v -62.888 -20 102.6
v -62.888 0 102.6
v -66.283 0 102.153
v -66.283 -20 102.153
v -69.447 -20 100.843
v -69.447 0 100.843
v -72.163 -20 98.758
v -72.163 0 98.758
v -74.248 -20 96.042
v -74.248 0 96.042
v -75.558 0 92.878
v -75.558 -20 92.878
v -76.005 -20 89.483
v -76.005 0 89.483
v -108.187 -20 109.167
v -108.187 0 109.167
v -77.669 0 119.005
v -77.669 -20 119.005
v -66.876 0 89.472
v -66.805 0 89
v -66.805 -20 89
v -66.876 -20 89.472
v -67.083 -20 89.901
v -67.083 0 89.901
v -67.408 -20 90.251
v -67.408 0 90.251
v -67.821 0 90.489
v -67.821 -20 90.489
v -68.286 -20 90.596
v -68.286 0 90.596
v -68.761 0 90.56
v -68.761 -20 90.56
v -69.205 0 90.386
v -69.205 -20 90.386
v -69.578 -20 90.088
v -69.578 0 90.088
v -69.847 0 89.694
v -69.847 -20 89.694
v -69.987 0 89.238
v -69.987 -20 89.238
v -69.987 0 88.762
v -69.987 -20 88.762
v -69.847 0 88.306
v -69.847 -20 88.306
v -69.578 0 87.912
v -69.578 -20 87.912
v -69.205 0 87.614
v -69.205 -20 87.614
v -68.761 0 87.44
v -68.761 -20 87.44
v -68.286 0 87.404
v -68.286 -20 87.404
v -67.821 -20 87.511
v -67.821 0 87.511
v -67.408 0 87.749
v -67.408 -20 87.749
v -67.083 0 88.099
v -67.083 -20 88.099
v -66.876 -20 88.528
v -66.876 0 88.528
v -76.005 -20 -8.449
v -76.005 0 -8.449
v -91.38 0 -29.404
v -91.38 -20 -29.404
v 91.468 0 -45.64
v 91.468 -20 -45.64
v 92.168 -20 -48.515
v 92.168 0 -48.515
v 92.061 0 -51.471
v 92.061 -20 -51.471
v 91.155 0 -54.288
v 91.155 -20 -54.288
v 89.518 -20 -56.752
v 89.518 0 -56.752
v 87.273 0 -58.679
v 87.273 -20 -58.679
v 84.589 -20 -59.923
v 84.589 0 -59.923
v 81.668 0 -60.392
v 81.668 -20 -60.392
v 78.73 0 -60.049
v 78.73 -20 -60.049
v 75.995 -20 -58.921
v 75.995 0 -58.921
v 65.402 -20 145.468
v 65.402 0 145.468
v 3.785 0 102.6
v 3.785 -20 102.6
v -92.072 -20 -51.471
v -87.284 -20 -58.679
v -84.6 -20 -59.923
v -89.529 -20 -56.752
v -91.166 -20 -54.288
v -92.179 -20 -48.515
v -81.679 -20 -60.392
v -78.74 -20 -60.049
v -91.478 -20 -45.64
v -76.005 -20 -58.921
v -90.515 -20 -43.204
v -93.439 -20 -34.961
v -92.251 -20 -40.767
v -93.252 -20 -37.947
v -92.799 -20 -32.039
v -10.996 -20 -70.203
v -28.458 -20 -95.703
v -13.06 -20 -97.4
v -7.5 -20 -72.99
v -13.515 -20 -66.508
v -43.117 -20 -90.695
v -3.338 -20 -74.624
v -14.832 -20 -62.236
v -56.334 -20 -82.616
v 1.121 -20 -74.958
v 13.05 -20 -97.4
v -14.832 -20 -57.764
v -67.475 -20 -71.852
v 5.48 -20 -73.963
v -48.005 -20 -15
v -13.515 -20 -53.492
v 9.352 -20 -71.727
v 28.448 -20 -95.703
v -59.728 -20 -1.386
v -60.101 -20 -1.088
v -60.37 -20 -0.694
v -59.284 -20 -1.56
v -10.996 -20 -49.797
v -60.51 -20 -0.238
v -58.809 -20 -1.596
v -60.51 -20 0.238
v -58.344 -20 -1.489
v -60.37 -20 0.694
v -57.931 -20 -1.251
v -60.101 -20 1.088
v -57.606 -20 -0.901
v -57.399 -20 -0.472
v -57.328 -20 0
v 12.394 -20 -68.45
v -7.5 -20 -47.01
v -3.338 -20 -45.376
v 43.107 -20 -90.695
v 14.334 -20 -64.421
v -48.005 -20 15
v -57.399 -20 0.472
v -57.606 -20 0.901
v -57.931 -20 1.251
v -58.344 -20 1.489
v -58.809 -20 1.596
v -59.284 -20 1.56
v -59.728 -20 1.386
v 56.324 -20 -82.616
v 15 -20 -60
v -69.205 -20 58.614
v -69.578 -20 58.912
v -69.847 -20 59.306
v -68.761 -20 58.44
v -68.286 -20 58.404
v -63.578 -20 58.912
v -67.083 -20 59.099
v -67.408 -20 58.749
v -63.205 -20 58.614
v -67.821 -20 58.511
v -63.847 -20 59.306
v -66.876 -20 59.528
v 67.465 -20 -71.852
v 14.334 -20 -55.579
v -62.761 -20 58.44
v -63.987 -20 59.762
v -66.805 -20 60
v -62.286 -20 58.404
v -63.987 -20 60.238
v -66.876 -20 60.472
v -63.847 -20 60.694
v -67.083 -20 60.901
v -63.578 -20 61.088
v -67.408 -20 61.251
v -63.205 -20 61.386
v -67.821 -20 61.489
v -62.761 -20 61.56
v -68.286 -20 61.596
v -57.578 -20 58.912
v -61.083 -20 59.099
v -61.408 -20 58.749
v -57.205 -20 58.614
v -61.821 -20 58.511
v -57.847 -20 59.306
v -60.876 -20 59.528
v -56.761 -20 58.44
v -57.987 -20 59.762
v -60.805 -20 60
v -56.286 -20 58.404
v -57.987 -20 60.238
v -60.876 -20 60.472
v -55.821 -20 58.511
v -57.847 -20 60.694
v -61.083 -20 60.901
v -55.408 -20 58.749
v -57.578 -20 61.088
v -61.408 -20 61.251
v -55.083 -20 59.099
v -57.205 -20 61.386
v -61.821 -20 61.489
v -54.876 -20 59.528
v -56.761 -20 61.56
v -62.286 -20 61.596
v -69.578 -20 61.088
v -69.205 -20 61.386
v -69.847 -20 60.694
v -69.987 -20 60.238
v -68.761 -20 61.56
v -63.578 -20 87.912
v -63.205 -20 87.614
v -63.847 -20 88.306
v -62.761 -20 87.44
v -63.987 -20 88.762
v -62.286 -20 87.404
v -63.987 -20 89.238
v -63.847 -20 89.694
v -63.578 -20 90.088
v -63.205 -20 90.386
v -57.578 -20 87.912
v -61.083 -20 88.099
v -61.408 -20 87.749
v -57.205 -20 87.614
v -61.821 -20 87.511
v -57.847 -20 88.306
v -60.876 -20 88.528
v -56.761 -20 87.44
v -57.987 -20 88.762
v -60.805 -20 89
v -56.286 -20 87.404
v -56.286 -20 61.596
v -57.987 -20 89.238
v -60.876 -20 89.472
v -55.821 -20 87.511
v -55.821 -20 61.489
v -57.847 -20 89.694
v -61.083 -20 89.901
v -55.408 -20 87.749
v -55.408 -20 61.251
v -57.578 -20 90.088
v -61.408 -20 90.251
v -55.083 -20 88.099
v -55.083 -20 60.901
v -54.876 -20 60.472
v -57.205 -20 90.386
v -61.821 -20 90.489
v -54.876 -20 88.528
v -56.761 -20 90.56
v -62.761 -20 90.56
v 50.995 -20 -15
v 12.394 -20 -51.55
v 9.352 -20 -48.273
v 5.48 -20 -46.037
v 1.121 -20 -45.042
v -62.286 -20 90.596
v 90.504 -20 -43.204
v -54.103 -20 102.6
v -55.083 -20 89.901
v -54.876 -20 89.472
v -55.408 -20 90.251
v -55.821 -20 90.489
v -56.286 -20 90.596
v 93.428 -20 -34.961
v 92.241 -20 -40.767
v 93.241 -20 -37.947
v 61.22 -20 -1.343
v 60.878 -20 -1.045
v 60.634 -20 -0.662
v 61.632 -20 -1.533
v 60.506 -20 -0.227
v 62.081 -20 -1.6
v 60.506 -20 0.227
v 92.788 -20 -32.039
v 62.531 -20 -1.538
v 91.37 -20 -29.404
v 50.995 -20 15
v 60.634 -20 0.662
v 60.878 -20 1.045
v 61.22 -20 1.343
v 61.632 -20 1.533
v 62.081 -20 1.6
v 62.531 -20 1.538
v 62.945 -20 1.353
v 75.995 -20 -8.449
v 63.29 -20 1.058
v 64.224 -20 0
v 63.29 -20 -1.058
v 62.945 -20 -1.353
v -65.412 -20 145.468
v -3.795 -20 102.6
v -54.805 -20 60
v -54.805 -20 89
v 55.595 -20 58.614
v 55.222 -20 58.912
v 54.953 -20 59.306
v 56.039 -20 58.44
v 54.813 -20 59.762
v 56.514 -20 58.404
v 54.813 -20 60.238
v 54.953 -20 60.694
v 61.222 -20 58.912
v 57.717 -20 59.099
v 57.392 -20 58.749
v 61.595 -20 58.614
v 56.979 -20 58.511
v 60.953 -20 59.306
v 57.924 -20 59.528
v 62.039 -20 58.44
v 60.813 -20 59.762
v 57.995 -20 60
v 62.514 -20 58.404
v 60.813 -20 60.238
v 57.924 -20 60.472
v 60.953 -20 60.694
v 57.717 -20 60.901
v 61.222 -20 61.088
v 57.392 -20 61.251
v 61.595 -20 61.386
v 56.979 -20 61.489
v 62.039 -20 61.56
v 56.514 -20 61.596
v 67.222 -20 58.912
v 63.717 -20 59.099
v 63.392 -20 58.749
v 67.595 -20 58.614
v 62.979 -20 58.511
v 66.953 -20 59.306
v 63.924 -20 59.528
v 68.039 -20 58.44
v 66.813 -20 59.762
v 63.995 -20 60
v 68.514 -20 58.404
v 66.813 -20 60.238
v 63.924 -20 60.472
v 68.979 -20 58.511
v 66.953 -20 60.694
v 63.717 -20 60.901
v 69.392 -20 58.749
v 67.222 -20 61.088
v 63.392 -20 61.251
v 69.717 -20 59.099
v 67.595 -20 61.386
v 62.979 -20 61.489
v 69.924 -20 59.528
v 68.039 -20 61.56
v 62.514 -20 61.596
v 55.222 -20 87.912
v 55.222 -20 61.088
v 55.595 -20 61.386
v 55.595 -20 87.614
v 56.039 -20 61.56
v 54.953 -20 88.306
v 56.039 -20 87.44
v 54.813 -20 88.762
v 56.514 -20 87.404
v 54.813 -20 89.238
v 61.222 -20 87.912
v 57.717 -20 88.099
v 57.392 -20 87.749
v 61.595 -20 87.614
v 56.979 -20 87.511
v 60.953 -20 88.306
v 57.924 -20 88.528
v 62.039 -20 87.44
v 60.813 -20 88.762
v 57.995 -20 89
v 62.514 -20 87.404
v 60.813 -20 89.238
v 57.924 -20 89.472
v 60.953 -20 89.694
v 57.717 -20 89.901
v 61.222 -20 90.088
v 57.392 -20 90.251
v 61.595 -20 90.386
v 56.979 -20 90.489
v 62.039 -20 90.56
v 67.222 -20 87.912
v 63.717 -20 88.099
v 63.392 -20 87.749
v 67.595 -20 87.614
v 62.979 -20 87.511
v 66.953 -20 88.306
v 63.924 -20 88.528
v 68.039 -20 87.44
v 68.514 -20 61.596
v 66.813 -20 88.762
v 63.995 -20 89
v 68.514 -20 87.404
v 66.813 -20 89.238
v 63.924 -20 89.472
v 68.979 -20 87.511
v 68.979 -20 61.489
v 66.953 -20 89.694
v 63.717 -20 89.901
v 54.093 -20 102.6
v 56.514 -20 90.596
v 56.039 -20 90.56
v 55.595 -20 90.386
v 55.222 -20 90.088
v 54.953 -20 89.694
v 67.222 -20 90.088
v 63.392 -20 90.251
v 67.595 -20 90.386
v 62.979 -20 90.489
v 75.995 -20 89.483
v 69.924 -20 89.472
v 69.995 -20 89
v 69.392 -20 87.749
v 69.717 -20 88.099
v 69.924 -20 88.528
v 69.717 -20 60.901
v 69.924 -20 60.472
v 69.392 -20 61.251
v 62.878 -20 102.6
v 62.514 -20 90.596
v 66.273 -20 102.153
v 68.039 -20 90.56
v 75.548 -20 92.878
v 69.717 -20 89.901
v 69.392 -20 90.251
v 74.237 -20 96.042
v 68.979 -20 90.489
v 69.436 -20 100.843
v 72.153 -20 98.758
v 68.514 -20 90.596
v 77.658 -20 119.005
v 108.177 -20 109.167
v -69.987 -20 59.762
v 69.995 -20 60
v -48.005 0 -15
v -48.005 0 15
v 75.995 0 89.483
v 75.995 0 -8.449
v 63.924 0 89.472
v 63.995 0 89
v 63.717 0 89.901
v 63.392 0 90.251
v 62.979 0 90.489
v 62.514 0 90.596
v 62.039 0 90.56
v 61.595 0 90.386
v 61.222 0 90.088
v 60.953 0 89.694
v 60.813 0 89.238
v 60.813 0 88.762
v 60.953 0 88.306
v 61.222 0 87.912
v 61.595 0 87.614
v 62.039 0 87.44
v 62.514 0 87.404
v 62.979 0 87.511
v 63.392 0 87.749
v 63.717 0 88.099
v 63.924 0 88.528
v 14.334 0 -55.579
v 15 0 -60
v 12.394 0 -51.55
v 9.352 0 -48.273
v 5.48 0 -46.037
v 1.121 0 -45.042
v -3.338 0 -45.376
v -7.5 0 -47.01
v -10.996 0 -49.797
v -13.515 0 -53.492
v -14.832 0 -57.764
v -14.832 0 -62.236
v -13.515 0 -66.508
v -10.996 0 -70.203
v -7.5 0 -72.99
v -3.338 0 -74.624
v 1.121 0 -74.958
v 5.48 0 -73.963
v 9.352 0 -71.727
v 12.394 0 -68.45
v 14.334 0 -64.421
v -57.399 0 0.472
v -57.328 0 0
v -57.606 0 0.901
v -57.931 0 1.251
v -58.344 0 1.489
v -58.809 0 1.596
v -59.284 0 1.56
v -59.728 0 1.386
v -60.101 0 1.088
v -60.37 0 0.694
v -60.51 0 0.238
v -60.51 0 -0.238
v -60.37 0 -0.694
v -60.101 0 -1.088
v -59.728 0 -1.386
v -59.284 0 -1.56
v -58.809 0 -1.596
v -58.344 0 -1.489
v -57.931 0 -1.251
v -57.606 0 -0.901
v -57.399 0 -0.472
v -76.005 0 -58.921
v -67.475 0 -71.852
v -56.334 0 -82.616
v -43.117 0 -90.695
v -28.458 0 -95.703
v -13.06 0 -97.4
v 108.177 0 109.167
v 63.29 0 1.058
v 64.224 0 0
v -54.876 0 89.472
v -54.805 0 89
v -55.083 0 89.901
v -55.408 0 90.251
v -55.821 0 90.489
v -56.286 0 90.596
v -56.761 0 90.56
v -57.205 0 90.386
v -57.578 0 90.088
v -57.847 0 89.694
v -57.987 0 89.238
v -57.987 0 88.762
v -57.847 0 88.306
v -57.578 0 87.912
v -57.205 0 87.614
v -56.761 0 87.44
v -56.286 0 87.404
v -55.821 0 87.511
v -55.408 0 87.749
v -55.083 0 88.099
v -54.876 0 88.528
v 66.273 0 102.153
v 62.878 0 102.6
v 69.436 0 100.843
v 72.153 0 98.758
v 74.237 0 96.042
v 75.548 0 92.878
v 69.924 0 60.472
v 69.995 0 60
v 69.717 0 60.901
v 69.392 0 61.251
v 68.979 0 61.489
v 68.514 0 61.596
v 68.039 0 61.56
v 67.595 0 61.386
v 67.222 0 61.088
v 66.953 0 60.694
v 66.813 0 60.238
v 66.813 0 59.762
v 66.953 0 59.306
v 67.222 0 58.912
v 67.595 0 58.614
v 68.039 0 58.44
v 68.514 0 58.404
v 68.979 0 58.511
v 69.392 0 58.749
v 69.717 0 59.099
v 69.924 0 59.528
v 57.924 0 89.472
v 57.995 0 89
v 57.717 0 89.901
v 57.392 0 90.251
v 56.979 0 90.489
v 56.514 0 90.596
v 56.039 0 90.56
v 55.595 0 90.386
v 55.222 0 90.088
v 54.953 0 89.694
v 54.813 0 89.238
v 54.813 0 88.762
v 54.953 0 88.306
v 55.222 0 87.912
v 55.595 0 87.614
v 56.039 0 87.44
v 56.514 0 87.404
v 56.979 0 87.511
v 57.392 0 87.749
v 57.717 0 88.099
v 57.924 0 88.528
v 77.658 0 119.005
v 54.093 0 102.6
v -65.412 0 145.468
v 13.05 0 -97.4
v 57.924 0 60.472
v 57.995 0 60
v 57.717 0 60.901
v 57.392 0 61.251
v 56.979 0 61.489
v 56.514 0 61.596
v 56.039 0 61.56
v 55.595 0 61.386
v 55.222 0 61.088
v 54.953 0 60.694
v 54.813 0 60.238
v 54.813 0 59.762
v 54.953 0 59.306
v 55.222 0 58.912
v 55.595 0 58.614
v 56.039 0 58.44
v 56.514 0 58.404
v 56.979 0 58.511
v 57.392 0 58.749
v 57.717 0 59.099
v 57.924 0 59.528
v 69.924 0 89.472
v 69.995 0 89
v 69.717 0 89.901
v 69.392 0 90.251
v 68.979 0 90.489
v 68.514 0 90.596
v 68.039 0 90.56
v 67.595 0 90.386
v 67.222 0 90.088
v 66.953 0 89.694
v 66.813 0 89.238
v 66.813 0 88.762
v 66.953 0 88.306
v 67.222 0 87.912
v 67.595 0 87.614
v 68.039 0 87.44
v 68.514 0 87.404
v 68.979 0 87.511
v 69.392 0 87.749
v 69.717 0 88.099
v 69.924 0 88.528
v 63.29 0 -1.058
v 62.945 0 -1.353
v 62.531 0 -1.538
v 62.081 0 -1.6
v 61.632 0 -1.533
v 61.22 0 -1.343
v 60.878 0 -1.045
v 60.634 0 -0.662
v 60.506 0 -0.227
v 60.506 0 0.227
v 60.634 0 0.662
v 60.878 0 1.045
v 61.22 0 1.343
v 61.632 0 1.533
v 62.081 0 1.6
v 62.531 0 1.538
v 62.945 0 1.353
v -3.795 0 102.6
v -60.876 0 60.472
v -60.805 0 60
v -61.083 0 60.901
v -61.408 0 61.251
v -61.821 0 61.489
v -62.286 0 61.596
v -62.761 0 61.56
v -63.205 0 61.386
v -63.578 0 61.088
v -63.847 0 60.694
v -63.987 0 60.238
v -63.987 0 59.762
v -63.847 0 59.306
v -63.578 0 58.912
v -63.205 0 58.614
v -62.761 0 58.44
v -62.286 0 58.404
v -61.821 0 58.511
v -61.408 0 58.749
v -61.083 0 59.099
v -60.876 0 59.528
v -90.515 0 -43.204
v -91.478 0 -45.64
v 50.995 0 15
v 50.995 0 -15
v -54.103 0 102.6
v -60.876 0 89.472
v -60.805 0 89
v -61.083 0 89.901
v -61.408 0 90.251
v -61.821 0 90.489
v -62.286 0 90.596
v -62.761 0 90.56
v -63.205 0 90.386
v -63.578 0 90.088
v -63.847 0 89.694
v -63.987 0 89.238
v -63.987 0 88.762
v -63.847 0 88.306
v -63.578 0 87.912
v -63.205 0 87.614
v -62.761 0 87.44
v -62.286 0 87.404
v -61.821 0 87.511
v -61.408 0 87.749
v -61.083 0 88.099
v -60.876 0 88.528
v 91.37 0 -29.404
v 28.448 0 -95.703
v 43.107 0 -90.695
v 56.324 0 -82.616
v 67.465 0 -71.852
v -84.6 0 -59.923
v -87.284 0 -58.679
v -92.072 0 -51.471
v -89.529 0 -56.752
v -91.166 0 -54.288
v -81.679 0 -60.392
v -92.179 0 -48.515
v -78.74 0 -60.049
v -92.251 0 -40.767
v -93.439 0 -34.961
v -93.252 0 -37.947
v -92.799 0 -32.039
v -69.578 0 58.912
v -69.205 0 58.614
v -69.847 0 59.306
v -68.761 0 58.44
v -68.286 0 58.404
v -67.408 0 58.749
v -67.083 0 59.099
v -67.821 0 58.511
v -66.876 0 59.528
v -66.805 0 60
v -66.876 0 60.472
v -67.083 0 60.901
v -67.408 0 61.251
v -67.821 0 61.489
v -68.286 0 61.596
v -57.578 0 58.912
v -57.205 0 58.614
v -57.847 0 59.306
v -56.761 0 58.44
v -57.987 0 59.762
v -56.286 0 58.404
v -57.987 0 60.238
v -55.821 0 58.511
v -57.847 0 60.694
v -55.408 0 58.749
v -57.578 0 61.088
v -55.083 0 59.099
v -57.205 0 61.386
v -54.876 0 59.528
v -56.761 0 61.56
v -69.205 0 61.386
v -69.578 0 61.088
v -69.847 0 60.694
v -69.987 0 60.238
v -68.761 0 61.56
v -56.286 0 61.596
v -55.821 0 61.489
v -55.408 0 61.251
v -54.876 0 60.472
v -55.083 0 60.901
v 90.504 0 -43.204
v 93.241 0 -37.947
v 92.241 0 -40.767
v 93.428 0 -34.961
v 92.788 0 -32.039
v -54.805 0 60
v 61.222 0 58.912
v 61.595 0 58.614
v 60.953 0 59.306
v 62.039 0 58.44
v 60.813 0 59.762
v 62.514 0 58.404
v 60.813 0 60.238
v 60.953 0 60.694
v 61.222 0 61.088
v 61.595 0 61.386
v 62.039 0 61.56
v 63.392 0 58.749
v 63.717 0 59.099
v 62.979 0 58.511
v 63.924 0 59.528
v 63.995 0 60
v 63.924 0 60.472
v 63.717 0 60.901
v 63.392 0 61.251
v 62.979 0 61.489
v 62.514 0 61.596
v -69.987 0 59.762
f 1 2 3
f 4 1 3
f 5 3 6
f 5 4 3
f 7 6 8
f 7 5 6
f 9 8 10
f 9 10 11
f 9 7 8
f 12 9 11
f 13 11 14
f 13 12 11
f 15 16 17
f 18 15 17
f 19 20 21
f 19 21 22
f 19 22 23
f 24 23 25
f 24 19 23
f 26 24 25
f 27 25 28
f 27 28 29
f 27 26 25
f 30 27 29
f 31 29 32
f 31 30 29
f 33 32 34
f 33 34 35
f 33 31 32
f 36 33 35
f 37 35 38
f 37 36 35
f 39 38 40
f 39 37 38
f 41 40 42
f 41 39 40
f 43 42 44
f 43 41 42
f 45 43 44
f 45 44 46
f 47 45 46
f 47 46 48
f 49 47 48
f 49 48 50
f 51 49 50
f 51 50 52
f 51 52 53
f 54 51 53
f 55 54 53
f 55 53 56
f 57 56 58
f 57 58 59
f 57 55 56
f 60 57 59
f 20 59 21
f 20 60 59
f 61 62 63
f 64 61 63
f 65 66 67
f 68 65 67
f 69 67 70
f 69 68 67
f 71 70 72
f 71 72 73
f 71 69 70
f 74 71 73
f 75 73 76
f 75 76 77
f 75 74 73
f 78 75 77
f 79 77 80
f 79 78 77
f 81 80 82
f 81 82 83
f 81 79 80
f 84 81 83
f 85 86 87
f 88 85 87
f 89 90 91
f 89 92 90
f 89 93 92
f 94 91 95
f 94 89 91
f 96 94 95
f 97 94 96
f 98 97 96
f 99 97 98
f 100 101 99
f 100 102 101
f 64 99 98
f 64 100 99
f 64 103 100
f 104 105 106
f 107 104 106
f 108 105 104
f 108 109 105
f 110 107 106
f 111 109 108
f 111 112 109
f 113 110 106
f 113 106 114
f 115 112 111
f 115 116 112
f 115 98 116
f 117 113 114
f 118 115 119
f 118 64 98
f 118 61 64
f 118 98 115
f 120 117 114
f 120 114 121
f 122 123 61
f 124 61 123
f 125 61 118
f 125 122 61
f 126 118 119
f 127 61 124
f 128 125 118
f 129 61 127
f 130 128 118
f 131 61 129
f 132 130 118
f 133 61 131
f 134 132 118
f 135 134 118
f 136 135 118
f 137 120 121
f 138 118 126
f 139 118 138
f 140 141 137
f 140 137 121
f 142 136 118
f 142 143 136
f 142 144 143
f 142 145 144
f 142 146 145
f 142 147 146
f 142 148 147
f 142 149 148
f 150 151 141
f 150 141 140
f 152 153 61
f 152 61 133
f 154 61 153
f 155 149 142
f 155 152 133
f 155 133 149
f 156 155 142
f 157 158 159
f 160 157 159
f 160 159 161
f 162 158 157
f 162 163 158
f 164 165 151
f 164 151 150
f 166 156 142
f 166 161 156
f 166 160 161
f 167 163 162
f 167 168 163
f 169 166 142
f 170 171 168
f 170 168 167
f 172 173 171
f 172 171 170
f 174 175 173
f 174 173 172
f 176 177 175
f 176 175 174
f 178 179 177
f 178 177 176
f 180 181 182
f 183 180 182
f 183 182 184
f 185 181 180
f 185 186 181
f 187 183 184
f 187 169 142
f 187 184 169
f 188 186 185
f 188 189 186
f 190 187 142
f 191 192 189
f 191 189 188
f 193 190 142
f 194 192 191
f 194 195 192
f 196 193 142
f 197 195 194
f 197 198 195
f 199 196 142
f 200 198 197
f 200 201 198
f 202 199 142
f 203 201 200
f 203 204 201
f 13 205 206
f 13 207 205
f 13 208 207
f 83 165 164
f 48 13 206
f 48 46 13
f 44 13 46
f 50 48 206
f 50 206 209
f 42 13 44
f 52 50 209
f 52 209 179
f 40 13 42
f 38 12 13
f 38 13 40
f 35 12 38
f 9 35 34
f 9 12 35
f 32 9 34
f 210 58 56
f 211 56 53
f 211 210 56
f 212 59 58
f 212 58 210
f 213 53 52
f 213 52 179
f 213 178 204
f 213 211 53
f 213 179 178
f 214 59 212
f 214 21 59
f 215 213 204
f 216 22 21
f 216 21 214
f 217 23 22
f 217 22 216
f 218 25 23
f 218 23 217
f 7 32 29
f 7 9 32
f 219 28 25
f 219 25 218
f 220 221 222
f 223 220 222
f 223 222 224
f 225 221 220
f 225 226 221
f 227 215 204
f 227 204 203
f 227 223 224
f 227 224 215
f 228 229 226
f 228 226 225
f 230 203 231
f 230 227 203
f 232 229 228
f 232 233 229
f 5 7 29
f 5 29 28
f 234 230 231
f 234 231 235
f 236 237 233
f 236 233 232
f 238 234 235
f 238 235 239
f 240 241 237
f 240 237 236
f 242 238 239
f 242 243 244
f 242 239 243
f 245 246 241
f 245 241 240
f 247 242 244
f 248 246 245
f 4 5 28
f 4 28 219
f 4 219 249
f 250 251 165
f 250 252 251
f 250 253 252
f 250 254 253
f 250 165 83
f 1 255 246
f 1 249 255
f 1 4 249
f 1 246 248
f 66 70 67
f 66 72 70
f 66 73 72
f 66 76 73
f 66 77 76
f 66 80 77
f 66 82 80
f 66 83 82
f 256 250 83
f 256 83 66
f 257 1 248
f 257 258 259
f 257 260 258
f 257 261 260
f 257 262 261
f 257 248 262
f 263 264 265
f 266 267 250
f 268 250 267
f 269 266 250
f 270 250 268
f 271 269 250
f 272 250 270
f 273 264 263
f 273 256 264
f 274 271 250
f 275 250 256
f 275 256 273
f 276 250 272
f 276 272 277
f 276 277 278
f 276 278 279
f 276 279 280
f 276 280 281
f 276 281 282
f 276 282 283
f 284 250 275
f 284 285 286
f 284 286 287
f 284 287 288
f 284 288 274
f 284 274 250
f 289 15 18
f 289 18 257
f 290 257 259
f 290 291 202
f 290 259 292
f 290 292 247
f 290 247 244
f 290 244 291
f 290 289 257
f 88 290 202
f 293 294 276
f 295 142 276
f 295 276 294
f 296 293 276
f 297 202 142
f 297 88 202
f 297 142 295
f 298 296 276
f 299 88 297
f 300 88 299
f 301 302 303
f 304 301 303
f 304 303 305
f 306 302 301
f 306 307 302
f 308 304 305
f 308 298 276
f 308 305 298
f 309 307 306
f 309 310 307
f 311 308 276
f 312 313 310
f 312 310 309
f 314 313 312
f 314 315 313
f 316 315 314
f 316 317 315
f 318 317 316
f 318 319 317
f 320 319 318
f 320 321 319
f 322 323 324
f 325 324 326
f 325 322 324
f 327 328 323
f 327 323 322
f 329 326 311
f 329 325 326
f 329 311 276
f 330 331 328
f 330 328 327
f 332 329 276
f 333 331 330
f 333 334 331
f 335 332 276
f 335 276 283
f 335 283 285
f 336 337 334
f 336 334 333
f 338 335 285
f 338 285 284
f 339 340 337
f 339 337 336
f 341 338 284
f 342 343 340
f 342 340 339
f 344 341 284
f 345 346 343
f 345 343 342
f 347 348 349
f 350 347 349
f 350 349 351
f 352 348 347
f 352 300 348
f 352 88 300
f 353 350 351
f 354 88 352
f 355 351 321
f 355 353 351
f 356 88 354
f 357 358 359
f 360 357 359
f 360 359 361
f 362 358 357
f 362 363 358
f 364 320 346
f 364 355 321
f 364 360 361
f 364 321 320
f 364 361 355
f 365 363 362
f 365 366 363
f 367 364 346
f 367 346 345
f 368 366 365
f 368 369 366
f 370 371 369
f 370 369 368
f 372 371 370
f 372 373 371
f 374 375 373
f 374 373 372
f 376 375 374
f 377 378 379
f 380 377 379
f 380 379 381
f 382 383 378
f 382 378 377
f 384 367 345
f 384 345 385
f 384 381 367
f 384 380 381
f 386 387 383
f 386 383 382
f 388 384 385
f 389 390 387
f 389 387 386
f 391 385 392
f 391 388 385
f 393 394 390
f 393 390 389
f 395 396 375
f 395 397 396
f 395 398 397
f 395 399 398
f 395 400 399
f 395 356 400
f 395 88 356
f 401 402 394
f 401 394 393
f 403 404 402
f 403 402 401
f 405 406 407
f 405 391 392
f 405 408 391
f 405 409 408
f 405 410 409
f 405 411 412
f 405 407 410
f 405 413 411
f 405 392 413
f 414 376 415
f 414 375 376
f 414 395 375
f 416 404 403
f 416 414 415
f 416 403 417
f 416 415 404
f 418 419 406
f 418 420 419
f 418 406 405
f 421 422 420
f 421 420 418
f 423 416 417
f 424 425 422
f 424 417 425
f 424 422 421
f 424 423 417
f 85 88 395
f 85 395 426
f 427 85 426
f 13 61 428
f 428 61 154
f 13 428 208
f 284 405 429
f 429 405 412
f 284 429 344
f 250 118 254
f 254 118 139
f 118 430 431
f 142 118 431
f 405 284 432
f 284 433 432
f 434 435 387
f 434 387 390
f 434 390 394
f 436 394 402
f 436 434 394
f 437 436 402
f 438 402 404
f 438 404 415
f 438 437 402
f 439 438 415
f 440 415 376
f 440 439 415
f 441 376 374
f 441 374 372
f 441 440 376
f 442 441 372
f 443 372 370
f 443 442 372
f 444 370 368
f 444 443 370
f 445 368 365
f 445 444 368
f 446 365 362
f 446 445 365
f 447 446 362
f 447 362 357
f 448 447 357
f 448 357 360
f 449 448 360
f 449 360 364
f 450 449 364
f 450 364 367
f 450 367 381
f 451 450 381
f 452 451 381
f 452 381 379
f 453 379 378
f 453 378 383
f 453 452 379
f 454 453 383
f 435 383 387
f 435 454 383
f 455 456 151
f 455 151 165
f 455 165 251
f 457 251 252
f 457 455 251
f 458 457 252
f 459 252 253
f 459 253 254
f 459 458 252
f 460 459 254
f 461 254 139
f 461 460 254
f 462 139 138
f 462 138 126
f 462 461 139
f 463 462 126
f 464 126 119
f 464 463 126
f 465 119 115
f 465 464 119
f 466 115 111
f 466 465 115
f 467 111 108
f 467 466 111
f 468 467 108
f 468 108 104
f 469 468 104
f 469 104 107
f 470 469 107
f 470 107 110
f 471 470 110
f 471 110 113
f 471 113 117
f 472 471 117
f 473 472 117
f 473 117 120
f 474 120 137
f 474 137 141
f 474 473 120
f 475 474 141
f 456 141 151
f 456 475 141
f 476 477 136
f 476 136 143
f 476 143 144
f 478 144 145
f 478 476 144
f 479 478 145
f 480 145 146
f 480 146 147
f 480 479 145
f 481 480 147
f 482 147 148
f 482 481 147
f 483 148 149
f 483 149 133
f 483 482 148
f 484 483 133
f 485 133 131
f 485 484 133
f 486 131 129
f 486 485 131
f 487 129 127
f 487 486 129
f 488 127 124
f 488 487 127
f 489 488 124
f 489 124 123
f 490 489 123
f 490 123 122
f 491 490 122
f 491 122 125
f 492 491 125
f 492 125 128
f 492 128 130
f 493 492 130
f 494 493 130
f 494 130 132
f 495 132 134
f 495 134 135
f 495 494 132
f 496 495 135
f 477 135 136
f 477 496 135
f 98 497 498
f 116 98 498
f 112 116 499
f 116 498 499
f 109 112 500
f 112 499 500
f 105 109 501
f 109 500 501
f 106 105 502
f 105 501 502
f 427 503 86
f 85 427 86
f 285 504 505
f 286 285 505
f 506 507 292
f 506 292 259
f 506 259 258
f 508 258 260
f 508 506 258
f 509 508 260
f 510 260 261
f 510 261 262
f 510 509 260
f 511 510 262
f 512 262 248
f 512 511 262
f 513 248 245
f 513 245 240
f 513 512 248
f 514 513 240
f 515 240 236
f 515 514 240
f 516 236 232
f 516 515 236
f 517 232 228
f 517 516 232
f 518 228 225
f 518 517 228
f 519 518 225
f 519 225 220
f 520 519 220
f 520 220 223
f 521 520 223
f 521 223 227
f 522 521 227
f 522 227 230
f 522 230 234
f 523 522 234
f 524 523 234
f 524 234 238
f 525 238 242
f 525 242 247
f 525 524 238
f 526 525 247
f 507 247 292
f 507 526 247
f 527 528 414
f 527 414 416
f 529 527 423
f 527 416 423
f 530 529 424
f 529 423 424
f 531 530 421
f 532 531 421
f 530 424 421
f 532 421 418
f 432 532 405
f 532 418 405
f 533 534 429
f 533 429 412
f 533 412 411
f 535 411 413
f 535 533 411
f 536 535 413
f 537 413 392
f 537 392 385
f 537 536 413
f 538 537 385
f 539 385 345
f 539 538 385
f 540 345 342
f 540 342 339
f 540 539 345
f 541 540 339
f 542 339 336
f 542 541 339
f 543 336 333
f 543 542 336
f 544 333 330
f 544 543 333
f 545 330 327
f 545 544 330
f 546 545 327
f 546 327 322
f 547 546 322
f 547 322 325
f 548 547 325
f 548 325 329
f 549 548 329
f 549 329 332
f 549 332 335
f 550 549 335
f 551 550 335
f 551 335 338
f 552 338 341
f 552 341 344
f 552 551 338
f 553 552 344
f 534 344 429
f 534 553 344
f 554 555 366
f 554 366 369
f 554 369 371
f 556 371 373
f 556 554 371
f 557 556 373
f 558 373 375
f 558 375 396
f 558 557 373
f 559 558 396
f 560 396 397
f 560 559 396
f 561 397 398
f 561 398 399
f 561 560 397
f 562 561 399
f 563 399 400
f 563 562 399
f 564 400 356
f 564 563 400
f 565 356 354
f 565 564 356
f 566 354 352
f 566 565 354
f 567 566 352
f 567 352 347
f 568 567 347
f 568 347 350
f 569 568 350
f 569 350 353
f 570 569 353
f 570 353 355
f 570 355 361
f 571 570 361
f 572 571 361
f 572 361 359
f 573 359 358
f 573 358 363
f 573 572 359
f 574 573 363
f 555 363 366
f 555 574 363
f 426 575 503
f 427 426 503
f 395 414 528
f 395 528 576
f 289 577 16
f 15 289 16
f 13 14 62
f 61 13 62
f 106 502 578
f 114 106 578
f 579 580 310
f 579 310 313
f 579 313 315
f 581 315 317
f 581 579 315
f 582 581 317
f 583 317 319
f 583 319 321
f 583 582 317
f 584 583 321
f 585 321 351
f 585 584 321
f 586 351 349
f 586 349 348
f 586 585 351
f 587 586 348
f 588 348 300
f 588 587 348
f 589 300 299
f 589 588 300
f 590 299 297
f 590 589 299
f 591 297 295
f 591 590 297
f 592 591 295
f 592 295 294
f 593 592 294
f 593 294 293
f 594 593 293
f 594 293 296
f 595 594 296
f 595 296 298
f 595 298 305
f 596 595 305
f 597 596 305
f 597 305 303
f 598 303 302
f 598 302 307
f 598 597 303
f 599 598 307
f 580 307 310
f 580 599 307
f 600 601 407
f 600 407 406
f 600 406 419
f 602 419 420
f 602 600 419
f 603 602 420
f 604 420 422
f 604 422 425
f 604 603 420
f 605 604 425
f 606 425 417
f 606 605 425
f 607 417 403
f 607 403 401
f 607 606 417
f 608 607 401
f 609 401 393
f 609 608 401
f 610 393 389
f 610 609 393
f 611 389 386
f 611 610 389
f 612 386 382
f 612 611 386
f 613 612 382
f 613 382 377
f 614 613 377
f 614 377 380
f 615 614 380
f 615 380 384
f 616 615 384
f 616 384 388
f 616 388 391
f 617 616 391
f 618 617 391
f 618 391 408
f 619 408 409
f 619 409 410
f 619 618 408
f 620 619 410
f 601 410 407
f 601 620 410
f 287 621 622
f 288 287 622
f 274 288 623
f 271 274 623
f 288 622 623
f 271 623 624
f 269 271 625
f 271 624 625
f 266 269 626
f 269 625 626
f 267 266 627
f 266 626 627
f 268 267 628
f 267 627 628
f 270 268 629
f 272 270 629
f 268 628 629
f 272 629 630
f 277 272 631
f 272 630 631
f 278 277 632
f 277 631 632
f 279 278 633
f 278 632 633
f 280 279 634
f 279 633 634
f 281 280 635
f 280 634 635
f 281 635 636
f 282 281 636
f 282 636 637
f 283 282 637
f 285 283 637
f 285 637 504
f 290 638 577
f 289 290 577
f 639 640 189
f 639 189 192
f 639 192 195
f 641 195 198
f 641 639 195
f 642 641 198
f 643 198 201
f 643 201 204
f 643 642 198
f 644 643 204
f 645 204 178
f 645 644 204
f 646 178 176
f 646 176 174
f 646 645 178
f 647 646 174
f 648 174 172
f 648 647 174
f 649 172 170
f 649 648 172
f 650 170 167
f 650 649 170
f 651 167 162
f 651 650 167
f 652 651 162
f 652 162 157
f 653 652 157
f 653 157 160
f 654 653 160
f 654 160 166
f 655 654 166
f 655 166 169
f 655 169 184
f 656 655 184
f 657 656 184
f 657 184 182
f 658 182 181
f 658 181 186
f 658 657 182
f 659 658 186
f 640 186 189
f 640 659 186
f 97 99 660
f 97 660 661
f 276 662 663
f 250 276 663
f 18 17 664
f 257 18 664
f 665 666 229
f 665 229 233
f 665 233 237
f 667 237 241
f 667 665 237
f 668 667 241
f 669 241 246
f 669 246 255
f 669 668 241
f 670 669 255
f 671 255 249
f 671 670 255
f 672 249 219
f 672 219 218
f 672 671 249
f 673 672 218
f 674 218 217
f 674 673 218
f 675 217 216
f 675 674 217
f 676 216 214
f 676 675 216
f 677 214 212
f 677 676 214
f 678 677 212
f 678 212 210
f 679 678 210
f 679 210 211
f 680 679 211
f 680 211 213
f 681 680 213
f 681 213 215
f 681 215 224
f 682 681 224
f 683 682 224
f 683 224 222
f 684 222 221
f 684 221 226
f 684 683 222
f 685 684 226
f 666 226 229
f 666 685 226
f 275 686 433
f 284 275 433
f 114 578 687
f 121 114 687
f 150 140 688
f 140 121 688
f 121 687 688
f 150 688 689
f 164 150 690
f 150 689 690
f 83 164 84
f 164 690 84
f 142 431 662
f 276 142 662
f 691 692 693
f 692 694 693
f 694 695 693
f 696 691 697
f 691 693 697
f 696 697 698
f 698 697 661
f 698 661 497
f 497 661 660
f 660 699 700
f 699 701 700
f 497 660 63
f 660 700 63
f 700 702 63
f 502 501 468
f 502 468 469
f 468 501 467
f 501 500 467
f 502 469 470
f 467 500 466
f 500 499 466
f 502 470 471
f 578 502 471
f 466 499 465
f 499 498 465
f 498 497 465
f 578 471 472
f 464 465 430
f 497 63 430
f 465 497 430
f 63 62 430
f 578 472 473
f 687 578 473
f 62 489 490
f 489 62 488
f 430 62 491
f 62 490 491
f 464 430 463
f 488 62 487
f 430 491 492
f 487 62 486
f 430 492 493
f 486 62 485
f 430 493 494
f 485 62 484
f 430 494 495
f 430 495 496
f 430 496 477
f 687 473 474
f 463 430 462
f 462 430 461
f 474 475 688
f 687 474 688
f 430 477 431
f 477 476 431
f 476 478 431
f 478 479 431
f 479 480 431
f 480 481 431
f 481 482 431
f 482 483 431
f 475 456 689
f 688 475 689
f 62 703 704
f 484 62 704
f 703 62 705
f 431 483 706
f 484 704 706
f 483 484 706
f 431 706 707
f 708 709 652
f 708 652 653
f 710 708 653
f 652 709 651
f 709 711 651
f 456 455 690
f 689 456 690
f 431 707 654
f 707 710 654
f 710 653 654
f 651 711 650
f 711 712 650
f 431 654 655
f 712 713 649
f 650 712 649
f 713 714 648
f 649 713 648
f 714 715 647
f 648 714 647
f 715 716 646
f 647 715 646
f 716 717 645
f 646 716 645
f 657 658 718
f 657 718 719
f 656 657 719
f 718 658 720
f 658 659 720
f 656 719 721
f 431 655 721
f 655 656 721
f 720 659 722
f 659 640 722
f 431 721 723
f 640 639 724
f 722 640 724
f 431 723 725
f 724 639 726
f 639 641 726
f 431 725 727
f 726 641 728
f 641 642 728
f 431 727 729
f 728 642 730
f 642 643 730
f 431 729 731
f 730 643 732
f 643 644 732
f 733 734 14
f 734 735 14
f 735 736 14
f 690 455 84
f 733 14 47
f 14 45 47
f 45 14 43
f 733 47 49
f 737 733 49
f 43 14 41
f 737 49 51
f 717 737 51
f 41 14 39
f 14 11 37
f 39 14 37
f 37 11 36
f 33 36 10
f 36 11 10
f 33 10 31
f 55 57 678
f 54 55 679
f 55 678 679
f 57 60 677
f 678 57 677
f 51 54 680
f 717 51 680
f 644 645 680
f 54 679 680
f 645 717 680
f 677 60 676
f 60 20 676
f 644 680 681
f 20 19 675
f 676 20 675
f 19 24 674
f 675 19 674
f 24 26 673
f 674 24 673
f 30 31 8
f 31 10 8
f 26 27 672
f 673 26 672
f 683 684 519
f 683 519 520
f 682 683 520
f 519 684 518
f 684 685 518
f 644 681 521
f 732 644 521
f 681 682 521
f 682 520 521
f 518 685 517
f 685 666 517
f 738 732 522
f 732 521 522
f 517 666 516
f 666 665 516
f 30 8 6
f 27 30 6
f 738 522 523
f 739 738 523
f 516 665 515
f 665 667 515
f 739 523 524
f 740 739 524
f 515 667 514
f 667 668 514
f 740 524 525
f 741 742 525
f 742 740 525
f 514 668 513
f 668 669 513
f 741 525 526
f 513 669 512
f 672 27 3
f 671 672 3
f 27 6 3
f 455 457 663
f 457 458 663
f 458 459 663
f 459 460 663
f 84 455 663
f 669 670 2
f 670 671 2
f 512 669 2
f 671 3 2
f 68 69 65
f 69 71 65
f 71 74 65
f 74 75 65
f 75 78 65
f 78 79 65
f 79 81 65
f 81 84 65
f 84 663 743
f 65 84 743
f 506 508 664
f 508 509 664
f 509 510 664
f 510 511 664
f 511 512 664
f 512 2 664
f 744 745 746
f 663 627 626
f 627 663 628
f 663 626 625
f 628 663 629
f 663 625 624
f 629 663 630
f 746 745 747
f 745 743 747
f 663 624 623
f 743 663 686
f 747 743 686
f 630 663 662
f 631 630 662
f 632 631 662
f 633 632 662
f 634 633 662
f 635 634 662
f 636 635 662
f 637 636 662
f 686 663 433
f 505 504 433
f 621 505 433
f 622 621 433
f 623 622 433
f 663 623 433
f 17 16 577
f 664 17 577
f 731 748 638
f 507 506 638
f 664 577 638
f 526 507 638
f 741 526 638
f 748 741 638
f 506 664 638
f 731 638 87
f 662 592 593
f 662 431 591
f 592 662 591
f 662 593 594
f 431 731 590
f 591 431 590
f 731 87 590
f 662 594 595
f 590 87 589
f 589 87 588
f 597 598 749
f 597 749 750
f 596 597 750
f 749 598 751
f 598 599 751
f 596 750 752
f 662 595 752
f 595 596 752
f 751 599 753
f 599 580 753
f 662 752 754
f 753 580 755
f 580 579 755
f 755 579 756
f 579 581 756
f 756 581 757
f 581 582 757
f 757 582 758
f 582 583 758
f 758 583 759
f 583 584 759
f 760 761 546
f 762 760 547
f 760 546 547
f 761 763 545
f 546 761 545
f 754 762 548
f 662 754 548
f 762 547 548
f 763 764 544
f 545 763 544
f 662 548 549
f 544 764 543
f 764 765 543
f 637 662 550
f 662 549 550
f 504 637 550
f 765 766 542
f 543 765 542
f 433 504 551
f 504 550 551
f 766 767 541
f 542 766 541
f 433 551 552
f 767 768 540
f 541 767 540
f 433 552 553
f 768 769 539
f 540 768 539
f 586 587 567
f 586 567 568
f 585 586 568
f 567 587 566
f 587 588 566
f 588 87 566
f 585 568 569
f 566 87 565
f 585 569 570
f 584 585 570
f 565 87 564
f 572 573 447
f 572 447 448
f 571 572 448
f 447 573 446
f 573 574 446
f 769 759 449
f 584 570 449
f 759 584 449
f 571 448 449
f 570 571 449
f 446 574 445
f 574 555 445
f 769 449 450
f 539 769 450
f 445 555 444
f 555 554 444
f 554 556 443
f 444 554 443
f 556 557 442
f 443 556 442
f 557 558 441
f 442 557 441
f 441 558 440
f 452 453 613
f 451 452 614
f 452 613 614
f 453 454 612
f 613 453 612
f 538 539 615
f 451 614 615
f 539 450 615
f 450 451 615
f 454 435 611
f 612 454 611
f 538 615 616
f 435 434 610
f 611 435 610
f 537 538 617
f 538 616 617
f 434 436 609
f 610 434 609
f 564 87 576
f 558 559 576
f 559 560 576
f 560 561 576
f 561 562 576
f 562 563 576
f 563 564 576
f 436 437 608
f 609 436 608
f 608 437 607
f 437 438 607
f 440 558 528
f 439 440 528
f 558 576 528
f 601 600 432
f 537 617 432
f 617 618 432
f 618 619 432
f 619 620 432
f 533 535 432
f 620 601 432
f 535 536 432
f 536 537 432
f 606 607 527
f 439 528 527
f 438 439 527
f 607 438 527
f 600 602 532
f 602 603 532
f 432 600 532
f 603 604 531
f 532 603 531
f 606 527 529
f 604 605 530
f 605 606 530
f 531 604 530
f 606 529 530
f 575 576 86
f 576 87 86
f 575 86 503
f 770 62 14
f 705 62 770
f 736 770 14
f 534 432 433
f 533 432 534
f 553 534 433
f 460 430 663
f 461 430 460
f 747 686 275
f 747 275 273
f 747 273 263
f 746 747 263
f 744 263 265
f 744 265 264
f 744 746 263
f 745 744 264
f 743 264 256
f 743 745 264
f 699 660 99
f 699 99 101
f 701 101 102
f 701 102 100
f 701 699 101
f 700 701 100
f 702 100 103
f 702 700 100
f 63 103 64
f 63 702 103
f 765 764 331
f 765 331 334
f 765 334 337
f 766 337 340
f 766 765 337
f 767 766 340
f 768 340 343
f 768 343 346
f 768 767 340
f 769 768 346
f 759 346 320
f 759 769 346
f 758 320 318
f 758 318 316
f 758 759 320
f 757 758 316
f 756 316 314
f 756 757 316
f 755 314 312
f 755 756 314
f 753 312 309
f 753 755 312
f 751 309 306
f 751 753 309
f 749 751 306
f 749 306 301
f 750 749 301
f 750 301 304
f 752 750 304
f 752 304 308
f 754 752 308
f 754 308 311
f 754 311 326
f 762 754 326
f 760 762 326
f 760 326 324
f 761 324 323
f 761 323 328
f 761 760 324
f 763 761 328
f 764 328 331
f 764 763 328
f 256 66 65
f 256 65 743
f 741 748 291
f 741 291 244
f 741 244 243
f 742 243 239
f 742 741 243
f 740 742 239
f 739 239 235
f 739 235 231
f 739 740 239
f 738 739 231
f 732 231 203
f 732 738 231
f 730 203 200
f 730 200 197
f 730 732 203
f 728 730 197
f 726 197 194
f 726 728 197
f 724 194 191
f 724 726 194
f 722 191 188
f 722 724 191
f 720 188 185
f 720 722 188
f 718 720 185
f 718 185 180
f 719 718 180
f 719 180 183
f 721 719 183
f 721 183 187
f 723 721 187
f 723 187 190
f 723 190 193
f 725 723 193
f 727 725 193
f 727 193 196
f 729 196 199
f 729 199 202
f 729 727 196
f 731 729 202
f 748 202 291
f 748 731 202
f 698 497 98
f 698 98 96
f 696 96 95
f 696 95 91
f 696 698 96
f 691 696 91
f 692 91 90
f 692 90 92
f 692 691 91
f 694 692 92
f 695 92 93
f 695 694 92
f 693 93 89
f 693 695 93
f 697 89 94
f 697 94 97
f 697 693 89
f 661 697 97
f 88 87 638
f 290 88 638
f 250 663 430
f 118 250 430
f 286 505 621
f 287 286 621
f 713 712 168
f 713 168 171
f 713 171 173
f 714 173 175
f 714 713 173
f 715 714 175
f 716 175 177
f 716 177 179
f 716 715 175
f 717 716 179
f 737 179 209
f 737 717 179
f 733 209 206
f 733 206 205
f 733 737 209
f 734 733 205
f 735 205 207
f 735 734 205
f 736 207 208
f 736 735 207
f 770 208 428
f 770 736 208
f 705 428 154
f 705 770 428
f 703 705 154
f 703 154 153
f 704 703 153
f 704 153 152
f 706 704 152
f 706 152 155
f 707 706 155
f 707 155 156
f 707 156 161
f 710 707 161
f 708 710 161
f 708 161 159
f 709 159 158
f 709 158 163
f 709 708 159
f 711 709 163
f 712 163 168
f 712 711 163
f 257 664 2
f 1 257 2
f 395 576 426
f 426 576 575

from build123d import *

# Parameters (mm, degrees)
F0_R        = 15
F0_R_2      = 1.6
F1_DEPTH    = 20
F2_R        = 11.6045153918
F3_DEPTH    = 20
F4_T1_DEPTH = 334.7254047122
F6_R        = 13.1169251871
F7_T1_DEPTH = 119.353153646
F7_T3_DEPTH = 204.1085089788


# Not quite as in the source:
# - a fillet or chamfer that OpenCascade refuses, or shapes differently, is made with other operations: its cross-section is extruded or revolved along the edge and cut away or added


with BuildPart() as f1:
    # F0 (on Front) → F1 (new body)
    with BuildSketch(Plane.XZ):
        Polygon((-54.1030839086, 102.6), (-76.0052064898, 102.6), (-76.0052064898, -8.4487323015), (-76.0052064898, -58.9213789776), (-76.0052064898, -97.4), (75.9947935102, -97.4), (75.9947935102, -58.9213789776), (75.9947935102, -8.4487323015), (75.9947935102, 102.6), (54.0926709289, 102.6), (3.7848638975, 102.6), (-0.0052064898, 102.6), (-3.7952768771, 102.6), align=None)
        with Locations((0, -60)):
            Circle(F0_R, mode=Mode.SUBTRACT)
        Polygon((-48.0052064898, 15), (-0.0052064898, 15), (50.9947935102, 15), (63.2902167228, 1.058300535), (64.2235500655, 0), (63.2902167424, -1.0583005129), (50.9947935102, -15), (-48.0052064898, -15), (-61.2339630452, 0), align=None, mode=Mode.SUBTRACT)
        with Locations((-68.4052064898, 60)):
            Circle(F0_R_2, mode=Mode.SUBTRACT)
        with Locations((-62.4052064898, 60)):
            Circle(F0_R_2, mode=Mode.SUBTRACT)
        with Locations((-56.4052064898, 60)):
            Circle(F0_R_2, mode=Mode.SUBTRACT)
        with Locations((-68.4052064898, 89)):
            Circle(F0_R_2, mode=Mode.SUBTRACT)
        with Locations((-62.4052064898, 89)):
            Circle(F0_R_2, mode=Mode.SUBTRACT)
        with Locations((-56.4052064898, 89)):
            Circle(F0_R_2, mode=Mode.SUBTRACT)
        with Locations((56.3947935102, 60)):
            Circle(F0_R_2, mode=Mode.SUBTRACT)
        with Locations((62.3947935102, 60)):
            Circle(F0_R_2, mode=Mode.SUBTRACT)
        with Locations((68.3947935102, 60)):
            Circle(F0_R_2, mode=Mode.SUBTRACT)
        with Locations((56.3947935102, 89)):
            Circle(F0_R_2, mode=Mode.SUBTRACT)
        with Locations((62.3947935102, 89)):
            Circle(F0_R_2, mode=Mode.SUBTRACT)
        with Locations((68.3947935102, 89)):
            Circle(F0_R_2, mode=Mode.SUBTRACT)
        Polygon((-77.668659389, 119.0051808953), (-54.1030839086, 102.6), (-3.7952768771, 102.6), (-65.412312746, 145.4675197601), (-108.1871464849, 109.1671809554), align=None)
        Polygon((-76.0052064898, -58.9213789776), (-76.0052064898, -8.4487323015), (-103.1352177745, -45.4250201583), (-90.5148283129, -43.2038009167), (-105.0179273372, -79.8825249076), align=None)
        Polygon((65.4018997664, 145.4675197601), (3.7848638975, 102.6), (54.0926709289, 102.6), (77.6582464094, 119.0051808953), (108.1767335052, 109.1671809554), align=None)
        Polygon((75.9947935102, -8.4487323015), (75.9947935102, -58.9213789776), (105.0075143576, -79.8825249076), (90.5044153333, -43.2038009167), (103.1248047948, -45.4250201583), align=None)
        with BuildLine():
            Line((63.2902167228, 1.058300535), (50.9947935102, 15))
            Line((50.9947935102, 15), (50.9947935102, -15))
            Line((50.9947935102, -15), (63.2902167424, -1.0583005129))
            ThreePointArc((63.2902167424, -1.0583005129), (60.4902167322, -1.48e-08), (63.2902167228, 1.058300535))
        make_face()
        Polygon((-48.0052064898, -15), (-48.0052064898, 15), (-61.2339630452, 0), align=None)
        with Locations((-58.9281324463, 0)):
            Circle(F0_R_2, mode=Mode.SUBTRACT)
    extrude(amount=F1_DEPTH)

    # F2
    f2_edges = [f1.edges().sort_by_distance(p)[0] for p in [
        (-76.005206, -10, 102.6),
        (-76.005206, -10, -97.4),
        (75.994794, -10, -97.4),
        (75.994794, -10, 102.6),
    ]]
    fillet(f2_edges, radius=F2_R)

    # F0 (on Front) → F3 (join)
    with BuildSketch(Plane.XZ):
        Polygon((-54.1030839086, 102.6), (-76.0052064898, 102.6), (-76.0052064898, -8.4487323015), (-76.0052064898, -58.9213789776), (-76.0052064898, -97.4), (75.9947935102, -97.4), (75.9947935102, -58.9213789776), (75.9947935102, -8.4487323015), (75.9947935102, 102.6), (54.0926709289, 102.6), (3.7848638975, 102.6), (-0.0052064898, 102.6), (-3.7952768771, 102.6), align=None)
        with Locations((0, -60)):
            Circle(F0_R, mode=Mode.SUBTRACT)
        Polygon((-48.0052064898, 15), (-0.0052064898, 15), (50.9947935102, 15), (63.2902167228, 1.058300535), (64.2235500655, 0), (63.2902167424, -1.0583005129), (50.9947935102, -15), (-48.0052064898, -15), (-61.2339630452, 0), align=None, mode=Mode.SUBTRACT)
        with Locations((-68.4052064898, 60)):
            Circle(F0_R_2, mode=Mode.SUBTRACT)
        with Locations((-62.4052064898, 60)):
            Circle(F0_R_2, mode=Mode.SUBTRACT)
        with Locations((-56.4052064898, 60)):
            Circle(F0_R_2, mode=Mode.SUBTRACT)
        with Locations((-68.4052064898, 89)):
            Circle(F0_R_2, mode=Mode.SUBTRACT)
        with Locations((-62.4052064898, 89)):
            Circle(F0_R_2, mode=Mode.SUBTRACT)
        with Locations((-56.4052064898, 89)):
            Circle(F0_R_2, mode=Mode.SUBTRACT)
        with Locations((56.3947935102, 60)):
            Circle(F0_R_2, mode=Mode.SUBTRACT)
        with Locations((62.3947935102, 60)):
            Circle(F0_R_2, mode=Mode.SUBTRACT)
        with Locations((68.3947935102, 60)):
            Circle(F0_R_2, mode=Mode.SUBTRACT)
        with Locations((56.3947935102, 89)):
            Circle(F0_R_2, mode=Mode.SUBTRACT)
        with Locations((62.3947935102, 89)):
            Circle(F0_R_2, mode=Mode.SUBTRACT)
        with Locations((68.3947935102, 89)):
            Circle(F0_R_2, mode=Mode.SUBTRACT)
        Polygon((-77.668659389, 119.0051808953), (-54.1030839086, 102.6), (-3.7952768771, 102.6), (-65.412312746, 145.4675197601), (-108.1871464849, 109.1671809554), align=None)
        Polygon((-76.0052064898, -58.9213789776), (-76.0052064898, -8.4487323015), (-103.1352177745, -45.4250201583), (-90.5148283129, -43.2038009167), (-105.0179273372, -79.8825249076), align=None)
        Polygon((65.4018997664, 145.4675197601), (3.7848638975, 102.6), (54.0926709289, 102.6), (77.6582464094, 119.0051808953), (108.1767335052, 109.1671809554), align=None)
        Polygon((75.9947935102, -8.4487323015), (75.9947935102, -58.9213789776), (105.0075143576, -79.8825249076), (90.5044153333, -43.2038009167), (103.1248047948, -45.4250201583), align=None)
        Polygon((-48.0052064898, -15), (-48.0052064898, 15), (-61.2339630452, 0), align=None)
        with Locations((-58.9281324463, 0)):
            Circle(F0_R_2, mode=Mode.SUBTRACT)
        with BuildLine():
            Line((63.2902167228, 1.058300535), (50.9947935102, 15))
            Line((50.9947935102, 15), (50.9947935102, -15))
            Line((50.9947935102, -15), (63.2902167424, -1.0583005129))
            ThreePointArc((63.2902167424, -1.0583005129), (60.4902167322, -1.48e-08), (63.2902167228, 1.058300535))
        make_face()
    extrude(amount=F3_DEPTH)

    # F4: fillet of radius 70.723525766 on 2 edges, made by hand

    # F4_s2 → F4_t1 (cut)
    with BuildSketch(Plane.XZ.offset(-157.3627023561)):
        with BuildLine():
            ThreePointArc((-76.0052064898, -58.9213789776), (-49.9474116045, -87.018376956), (-13.0601255474, -97.4))
            Line((-13.0601255474, -97.4), (-76.0052064898, -97.4))
            Line((-76.0052064898, -97.4), (-76.0052064898, -58.9213789776))
        make_face()
        with BuildLine():
            ThreePointArc((13.0497125677, -97.4), (49.9369986248, -87.018376956), (75.9947935102, -58.9213789776))
            Line((75.9947935102, -58.9213789776), (75.9947935102, -97.4))
            Line((75.9947935102, -97.4), (13.0497125677, -97.4))
        make_face()
    extrude(amount=F4_T1_DEPTH, mode=Mode.SUBTRACT)

    # F6
    f6_edges = [f1.edges().sort_by_distance(p)[0] for p in [
        (75.994794, -10, 102.6),
        (-76.005206, -10, 102.6),
    ]]
    fillet(f6_edges, radius=F6_R)

    # F7: fillet of radius 10.7873299095 on 4 edges, made by hand

    # F7_s2 → F7_t1 (cut)
    with BuildSketch(Plane.XZ.offset(-49.676576823)):
        with BuildLine():
            ThreePointArc((91.3700727829, -29.4041512397), (93.4388619061, -36.4609035493), (90.5044153333, -43.2038009167))
            Line((90.5044153333, -43.2038009167), (103.1248047948, -45.4250201583))
            Line((103.1248047948, -45.4250201583), (91.3700727829, -29.4041512397))
        make_face()
        with BuildLine():
            ThreePointArc((-90.5148283129, -43.2038009167), (-93.4492748858, -36.4609035493), (-91.3804857626, -29.4041512397))
            Line((-91.3804857626, -29.4041512397), (-103.1352177745, -45.4250201583))
            Line((-103.1352177745, -45.4250201583), (-90.5148283129, -43.2038009167))
        make_face()
    extrude(amount=F7_T1_DEPTH, mode=Mode.SUBTRACT)

    # F7_s4 → F7_t3 (cut)
    with BuildSketch(Plane.XZ.offset(-92.0542544894)):
        with BuildLine():
            ThreePointArc((-76.0052064898, -58.9213789776), (-88.4725874625, -57.7926608942), (-91.4783185714, -45.6404934608))
            Line((-91.4783185714, -45.6404934608), (-105.0179273372, -79.8825249076))
            Line((-105.0179273372, -79.8825249076), (-76.0052064898, -58.9213789776))
        make_face()
        with BuildLine():
            ThreePointArc((91.4679055918, -45.6404934608), (88.4621744828, -57.7926608942), (75.9947935102, -58.9213789776))
            Line((75.9947935102, -58.9213789776), (105.0075143576, -79.8825249076))
            Line((105.0075143576, -79.8825249076), (91.4679055918, -45.6404934608))
        make_face()
    extrude(amount=F7_T3_DEPTH, mode=Mode.SUBTRACT)


solid = f1.part
